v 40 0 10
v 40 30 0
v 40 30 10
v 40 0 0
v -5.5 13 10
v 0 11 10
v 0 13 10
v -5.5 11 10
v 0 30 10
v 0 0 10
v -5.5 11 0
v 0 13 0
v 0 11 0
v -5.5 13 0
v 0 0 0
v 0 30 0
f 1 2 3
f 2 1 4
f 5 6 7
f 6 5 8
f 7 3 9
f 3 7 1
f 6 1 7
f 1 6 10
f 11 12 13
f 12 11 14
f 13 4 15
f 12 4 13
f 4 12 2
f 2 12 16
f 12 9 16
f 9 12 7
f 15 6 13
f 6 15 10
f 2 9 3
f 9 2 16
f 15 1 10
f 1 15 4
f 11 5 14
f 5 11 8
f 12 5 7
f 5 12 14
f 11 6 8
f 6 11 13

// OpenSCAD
// units=mm — generated by scad_emitter.py
// part=unnamed
$fn = 48;

union() { cube([40, 30, 10]); translate([-5.5, 11, 0]) cube([6.5, 2, 10]); }
